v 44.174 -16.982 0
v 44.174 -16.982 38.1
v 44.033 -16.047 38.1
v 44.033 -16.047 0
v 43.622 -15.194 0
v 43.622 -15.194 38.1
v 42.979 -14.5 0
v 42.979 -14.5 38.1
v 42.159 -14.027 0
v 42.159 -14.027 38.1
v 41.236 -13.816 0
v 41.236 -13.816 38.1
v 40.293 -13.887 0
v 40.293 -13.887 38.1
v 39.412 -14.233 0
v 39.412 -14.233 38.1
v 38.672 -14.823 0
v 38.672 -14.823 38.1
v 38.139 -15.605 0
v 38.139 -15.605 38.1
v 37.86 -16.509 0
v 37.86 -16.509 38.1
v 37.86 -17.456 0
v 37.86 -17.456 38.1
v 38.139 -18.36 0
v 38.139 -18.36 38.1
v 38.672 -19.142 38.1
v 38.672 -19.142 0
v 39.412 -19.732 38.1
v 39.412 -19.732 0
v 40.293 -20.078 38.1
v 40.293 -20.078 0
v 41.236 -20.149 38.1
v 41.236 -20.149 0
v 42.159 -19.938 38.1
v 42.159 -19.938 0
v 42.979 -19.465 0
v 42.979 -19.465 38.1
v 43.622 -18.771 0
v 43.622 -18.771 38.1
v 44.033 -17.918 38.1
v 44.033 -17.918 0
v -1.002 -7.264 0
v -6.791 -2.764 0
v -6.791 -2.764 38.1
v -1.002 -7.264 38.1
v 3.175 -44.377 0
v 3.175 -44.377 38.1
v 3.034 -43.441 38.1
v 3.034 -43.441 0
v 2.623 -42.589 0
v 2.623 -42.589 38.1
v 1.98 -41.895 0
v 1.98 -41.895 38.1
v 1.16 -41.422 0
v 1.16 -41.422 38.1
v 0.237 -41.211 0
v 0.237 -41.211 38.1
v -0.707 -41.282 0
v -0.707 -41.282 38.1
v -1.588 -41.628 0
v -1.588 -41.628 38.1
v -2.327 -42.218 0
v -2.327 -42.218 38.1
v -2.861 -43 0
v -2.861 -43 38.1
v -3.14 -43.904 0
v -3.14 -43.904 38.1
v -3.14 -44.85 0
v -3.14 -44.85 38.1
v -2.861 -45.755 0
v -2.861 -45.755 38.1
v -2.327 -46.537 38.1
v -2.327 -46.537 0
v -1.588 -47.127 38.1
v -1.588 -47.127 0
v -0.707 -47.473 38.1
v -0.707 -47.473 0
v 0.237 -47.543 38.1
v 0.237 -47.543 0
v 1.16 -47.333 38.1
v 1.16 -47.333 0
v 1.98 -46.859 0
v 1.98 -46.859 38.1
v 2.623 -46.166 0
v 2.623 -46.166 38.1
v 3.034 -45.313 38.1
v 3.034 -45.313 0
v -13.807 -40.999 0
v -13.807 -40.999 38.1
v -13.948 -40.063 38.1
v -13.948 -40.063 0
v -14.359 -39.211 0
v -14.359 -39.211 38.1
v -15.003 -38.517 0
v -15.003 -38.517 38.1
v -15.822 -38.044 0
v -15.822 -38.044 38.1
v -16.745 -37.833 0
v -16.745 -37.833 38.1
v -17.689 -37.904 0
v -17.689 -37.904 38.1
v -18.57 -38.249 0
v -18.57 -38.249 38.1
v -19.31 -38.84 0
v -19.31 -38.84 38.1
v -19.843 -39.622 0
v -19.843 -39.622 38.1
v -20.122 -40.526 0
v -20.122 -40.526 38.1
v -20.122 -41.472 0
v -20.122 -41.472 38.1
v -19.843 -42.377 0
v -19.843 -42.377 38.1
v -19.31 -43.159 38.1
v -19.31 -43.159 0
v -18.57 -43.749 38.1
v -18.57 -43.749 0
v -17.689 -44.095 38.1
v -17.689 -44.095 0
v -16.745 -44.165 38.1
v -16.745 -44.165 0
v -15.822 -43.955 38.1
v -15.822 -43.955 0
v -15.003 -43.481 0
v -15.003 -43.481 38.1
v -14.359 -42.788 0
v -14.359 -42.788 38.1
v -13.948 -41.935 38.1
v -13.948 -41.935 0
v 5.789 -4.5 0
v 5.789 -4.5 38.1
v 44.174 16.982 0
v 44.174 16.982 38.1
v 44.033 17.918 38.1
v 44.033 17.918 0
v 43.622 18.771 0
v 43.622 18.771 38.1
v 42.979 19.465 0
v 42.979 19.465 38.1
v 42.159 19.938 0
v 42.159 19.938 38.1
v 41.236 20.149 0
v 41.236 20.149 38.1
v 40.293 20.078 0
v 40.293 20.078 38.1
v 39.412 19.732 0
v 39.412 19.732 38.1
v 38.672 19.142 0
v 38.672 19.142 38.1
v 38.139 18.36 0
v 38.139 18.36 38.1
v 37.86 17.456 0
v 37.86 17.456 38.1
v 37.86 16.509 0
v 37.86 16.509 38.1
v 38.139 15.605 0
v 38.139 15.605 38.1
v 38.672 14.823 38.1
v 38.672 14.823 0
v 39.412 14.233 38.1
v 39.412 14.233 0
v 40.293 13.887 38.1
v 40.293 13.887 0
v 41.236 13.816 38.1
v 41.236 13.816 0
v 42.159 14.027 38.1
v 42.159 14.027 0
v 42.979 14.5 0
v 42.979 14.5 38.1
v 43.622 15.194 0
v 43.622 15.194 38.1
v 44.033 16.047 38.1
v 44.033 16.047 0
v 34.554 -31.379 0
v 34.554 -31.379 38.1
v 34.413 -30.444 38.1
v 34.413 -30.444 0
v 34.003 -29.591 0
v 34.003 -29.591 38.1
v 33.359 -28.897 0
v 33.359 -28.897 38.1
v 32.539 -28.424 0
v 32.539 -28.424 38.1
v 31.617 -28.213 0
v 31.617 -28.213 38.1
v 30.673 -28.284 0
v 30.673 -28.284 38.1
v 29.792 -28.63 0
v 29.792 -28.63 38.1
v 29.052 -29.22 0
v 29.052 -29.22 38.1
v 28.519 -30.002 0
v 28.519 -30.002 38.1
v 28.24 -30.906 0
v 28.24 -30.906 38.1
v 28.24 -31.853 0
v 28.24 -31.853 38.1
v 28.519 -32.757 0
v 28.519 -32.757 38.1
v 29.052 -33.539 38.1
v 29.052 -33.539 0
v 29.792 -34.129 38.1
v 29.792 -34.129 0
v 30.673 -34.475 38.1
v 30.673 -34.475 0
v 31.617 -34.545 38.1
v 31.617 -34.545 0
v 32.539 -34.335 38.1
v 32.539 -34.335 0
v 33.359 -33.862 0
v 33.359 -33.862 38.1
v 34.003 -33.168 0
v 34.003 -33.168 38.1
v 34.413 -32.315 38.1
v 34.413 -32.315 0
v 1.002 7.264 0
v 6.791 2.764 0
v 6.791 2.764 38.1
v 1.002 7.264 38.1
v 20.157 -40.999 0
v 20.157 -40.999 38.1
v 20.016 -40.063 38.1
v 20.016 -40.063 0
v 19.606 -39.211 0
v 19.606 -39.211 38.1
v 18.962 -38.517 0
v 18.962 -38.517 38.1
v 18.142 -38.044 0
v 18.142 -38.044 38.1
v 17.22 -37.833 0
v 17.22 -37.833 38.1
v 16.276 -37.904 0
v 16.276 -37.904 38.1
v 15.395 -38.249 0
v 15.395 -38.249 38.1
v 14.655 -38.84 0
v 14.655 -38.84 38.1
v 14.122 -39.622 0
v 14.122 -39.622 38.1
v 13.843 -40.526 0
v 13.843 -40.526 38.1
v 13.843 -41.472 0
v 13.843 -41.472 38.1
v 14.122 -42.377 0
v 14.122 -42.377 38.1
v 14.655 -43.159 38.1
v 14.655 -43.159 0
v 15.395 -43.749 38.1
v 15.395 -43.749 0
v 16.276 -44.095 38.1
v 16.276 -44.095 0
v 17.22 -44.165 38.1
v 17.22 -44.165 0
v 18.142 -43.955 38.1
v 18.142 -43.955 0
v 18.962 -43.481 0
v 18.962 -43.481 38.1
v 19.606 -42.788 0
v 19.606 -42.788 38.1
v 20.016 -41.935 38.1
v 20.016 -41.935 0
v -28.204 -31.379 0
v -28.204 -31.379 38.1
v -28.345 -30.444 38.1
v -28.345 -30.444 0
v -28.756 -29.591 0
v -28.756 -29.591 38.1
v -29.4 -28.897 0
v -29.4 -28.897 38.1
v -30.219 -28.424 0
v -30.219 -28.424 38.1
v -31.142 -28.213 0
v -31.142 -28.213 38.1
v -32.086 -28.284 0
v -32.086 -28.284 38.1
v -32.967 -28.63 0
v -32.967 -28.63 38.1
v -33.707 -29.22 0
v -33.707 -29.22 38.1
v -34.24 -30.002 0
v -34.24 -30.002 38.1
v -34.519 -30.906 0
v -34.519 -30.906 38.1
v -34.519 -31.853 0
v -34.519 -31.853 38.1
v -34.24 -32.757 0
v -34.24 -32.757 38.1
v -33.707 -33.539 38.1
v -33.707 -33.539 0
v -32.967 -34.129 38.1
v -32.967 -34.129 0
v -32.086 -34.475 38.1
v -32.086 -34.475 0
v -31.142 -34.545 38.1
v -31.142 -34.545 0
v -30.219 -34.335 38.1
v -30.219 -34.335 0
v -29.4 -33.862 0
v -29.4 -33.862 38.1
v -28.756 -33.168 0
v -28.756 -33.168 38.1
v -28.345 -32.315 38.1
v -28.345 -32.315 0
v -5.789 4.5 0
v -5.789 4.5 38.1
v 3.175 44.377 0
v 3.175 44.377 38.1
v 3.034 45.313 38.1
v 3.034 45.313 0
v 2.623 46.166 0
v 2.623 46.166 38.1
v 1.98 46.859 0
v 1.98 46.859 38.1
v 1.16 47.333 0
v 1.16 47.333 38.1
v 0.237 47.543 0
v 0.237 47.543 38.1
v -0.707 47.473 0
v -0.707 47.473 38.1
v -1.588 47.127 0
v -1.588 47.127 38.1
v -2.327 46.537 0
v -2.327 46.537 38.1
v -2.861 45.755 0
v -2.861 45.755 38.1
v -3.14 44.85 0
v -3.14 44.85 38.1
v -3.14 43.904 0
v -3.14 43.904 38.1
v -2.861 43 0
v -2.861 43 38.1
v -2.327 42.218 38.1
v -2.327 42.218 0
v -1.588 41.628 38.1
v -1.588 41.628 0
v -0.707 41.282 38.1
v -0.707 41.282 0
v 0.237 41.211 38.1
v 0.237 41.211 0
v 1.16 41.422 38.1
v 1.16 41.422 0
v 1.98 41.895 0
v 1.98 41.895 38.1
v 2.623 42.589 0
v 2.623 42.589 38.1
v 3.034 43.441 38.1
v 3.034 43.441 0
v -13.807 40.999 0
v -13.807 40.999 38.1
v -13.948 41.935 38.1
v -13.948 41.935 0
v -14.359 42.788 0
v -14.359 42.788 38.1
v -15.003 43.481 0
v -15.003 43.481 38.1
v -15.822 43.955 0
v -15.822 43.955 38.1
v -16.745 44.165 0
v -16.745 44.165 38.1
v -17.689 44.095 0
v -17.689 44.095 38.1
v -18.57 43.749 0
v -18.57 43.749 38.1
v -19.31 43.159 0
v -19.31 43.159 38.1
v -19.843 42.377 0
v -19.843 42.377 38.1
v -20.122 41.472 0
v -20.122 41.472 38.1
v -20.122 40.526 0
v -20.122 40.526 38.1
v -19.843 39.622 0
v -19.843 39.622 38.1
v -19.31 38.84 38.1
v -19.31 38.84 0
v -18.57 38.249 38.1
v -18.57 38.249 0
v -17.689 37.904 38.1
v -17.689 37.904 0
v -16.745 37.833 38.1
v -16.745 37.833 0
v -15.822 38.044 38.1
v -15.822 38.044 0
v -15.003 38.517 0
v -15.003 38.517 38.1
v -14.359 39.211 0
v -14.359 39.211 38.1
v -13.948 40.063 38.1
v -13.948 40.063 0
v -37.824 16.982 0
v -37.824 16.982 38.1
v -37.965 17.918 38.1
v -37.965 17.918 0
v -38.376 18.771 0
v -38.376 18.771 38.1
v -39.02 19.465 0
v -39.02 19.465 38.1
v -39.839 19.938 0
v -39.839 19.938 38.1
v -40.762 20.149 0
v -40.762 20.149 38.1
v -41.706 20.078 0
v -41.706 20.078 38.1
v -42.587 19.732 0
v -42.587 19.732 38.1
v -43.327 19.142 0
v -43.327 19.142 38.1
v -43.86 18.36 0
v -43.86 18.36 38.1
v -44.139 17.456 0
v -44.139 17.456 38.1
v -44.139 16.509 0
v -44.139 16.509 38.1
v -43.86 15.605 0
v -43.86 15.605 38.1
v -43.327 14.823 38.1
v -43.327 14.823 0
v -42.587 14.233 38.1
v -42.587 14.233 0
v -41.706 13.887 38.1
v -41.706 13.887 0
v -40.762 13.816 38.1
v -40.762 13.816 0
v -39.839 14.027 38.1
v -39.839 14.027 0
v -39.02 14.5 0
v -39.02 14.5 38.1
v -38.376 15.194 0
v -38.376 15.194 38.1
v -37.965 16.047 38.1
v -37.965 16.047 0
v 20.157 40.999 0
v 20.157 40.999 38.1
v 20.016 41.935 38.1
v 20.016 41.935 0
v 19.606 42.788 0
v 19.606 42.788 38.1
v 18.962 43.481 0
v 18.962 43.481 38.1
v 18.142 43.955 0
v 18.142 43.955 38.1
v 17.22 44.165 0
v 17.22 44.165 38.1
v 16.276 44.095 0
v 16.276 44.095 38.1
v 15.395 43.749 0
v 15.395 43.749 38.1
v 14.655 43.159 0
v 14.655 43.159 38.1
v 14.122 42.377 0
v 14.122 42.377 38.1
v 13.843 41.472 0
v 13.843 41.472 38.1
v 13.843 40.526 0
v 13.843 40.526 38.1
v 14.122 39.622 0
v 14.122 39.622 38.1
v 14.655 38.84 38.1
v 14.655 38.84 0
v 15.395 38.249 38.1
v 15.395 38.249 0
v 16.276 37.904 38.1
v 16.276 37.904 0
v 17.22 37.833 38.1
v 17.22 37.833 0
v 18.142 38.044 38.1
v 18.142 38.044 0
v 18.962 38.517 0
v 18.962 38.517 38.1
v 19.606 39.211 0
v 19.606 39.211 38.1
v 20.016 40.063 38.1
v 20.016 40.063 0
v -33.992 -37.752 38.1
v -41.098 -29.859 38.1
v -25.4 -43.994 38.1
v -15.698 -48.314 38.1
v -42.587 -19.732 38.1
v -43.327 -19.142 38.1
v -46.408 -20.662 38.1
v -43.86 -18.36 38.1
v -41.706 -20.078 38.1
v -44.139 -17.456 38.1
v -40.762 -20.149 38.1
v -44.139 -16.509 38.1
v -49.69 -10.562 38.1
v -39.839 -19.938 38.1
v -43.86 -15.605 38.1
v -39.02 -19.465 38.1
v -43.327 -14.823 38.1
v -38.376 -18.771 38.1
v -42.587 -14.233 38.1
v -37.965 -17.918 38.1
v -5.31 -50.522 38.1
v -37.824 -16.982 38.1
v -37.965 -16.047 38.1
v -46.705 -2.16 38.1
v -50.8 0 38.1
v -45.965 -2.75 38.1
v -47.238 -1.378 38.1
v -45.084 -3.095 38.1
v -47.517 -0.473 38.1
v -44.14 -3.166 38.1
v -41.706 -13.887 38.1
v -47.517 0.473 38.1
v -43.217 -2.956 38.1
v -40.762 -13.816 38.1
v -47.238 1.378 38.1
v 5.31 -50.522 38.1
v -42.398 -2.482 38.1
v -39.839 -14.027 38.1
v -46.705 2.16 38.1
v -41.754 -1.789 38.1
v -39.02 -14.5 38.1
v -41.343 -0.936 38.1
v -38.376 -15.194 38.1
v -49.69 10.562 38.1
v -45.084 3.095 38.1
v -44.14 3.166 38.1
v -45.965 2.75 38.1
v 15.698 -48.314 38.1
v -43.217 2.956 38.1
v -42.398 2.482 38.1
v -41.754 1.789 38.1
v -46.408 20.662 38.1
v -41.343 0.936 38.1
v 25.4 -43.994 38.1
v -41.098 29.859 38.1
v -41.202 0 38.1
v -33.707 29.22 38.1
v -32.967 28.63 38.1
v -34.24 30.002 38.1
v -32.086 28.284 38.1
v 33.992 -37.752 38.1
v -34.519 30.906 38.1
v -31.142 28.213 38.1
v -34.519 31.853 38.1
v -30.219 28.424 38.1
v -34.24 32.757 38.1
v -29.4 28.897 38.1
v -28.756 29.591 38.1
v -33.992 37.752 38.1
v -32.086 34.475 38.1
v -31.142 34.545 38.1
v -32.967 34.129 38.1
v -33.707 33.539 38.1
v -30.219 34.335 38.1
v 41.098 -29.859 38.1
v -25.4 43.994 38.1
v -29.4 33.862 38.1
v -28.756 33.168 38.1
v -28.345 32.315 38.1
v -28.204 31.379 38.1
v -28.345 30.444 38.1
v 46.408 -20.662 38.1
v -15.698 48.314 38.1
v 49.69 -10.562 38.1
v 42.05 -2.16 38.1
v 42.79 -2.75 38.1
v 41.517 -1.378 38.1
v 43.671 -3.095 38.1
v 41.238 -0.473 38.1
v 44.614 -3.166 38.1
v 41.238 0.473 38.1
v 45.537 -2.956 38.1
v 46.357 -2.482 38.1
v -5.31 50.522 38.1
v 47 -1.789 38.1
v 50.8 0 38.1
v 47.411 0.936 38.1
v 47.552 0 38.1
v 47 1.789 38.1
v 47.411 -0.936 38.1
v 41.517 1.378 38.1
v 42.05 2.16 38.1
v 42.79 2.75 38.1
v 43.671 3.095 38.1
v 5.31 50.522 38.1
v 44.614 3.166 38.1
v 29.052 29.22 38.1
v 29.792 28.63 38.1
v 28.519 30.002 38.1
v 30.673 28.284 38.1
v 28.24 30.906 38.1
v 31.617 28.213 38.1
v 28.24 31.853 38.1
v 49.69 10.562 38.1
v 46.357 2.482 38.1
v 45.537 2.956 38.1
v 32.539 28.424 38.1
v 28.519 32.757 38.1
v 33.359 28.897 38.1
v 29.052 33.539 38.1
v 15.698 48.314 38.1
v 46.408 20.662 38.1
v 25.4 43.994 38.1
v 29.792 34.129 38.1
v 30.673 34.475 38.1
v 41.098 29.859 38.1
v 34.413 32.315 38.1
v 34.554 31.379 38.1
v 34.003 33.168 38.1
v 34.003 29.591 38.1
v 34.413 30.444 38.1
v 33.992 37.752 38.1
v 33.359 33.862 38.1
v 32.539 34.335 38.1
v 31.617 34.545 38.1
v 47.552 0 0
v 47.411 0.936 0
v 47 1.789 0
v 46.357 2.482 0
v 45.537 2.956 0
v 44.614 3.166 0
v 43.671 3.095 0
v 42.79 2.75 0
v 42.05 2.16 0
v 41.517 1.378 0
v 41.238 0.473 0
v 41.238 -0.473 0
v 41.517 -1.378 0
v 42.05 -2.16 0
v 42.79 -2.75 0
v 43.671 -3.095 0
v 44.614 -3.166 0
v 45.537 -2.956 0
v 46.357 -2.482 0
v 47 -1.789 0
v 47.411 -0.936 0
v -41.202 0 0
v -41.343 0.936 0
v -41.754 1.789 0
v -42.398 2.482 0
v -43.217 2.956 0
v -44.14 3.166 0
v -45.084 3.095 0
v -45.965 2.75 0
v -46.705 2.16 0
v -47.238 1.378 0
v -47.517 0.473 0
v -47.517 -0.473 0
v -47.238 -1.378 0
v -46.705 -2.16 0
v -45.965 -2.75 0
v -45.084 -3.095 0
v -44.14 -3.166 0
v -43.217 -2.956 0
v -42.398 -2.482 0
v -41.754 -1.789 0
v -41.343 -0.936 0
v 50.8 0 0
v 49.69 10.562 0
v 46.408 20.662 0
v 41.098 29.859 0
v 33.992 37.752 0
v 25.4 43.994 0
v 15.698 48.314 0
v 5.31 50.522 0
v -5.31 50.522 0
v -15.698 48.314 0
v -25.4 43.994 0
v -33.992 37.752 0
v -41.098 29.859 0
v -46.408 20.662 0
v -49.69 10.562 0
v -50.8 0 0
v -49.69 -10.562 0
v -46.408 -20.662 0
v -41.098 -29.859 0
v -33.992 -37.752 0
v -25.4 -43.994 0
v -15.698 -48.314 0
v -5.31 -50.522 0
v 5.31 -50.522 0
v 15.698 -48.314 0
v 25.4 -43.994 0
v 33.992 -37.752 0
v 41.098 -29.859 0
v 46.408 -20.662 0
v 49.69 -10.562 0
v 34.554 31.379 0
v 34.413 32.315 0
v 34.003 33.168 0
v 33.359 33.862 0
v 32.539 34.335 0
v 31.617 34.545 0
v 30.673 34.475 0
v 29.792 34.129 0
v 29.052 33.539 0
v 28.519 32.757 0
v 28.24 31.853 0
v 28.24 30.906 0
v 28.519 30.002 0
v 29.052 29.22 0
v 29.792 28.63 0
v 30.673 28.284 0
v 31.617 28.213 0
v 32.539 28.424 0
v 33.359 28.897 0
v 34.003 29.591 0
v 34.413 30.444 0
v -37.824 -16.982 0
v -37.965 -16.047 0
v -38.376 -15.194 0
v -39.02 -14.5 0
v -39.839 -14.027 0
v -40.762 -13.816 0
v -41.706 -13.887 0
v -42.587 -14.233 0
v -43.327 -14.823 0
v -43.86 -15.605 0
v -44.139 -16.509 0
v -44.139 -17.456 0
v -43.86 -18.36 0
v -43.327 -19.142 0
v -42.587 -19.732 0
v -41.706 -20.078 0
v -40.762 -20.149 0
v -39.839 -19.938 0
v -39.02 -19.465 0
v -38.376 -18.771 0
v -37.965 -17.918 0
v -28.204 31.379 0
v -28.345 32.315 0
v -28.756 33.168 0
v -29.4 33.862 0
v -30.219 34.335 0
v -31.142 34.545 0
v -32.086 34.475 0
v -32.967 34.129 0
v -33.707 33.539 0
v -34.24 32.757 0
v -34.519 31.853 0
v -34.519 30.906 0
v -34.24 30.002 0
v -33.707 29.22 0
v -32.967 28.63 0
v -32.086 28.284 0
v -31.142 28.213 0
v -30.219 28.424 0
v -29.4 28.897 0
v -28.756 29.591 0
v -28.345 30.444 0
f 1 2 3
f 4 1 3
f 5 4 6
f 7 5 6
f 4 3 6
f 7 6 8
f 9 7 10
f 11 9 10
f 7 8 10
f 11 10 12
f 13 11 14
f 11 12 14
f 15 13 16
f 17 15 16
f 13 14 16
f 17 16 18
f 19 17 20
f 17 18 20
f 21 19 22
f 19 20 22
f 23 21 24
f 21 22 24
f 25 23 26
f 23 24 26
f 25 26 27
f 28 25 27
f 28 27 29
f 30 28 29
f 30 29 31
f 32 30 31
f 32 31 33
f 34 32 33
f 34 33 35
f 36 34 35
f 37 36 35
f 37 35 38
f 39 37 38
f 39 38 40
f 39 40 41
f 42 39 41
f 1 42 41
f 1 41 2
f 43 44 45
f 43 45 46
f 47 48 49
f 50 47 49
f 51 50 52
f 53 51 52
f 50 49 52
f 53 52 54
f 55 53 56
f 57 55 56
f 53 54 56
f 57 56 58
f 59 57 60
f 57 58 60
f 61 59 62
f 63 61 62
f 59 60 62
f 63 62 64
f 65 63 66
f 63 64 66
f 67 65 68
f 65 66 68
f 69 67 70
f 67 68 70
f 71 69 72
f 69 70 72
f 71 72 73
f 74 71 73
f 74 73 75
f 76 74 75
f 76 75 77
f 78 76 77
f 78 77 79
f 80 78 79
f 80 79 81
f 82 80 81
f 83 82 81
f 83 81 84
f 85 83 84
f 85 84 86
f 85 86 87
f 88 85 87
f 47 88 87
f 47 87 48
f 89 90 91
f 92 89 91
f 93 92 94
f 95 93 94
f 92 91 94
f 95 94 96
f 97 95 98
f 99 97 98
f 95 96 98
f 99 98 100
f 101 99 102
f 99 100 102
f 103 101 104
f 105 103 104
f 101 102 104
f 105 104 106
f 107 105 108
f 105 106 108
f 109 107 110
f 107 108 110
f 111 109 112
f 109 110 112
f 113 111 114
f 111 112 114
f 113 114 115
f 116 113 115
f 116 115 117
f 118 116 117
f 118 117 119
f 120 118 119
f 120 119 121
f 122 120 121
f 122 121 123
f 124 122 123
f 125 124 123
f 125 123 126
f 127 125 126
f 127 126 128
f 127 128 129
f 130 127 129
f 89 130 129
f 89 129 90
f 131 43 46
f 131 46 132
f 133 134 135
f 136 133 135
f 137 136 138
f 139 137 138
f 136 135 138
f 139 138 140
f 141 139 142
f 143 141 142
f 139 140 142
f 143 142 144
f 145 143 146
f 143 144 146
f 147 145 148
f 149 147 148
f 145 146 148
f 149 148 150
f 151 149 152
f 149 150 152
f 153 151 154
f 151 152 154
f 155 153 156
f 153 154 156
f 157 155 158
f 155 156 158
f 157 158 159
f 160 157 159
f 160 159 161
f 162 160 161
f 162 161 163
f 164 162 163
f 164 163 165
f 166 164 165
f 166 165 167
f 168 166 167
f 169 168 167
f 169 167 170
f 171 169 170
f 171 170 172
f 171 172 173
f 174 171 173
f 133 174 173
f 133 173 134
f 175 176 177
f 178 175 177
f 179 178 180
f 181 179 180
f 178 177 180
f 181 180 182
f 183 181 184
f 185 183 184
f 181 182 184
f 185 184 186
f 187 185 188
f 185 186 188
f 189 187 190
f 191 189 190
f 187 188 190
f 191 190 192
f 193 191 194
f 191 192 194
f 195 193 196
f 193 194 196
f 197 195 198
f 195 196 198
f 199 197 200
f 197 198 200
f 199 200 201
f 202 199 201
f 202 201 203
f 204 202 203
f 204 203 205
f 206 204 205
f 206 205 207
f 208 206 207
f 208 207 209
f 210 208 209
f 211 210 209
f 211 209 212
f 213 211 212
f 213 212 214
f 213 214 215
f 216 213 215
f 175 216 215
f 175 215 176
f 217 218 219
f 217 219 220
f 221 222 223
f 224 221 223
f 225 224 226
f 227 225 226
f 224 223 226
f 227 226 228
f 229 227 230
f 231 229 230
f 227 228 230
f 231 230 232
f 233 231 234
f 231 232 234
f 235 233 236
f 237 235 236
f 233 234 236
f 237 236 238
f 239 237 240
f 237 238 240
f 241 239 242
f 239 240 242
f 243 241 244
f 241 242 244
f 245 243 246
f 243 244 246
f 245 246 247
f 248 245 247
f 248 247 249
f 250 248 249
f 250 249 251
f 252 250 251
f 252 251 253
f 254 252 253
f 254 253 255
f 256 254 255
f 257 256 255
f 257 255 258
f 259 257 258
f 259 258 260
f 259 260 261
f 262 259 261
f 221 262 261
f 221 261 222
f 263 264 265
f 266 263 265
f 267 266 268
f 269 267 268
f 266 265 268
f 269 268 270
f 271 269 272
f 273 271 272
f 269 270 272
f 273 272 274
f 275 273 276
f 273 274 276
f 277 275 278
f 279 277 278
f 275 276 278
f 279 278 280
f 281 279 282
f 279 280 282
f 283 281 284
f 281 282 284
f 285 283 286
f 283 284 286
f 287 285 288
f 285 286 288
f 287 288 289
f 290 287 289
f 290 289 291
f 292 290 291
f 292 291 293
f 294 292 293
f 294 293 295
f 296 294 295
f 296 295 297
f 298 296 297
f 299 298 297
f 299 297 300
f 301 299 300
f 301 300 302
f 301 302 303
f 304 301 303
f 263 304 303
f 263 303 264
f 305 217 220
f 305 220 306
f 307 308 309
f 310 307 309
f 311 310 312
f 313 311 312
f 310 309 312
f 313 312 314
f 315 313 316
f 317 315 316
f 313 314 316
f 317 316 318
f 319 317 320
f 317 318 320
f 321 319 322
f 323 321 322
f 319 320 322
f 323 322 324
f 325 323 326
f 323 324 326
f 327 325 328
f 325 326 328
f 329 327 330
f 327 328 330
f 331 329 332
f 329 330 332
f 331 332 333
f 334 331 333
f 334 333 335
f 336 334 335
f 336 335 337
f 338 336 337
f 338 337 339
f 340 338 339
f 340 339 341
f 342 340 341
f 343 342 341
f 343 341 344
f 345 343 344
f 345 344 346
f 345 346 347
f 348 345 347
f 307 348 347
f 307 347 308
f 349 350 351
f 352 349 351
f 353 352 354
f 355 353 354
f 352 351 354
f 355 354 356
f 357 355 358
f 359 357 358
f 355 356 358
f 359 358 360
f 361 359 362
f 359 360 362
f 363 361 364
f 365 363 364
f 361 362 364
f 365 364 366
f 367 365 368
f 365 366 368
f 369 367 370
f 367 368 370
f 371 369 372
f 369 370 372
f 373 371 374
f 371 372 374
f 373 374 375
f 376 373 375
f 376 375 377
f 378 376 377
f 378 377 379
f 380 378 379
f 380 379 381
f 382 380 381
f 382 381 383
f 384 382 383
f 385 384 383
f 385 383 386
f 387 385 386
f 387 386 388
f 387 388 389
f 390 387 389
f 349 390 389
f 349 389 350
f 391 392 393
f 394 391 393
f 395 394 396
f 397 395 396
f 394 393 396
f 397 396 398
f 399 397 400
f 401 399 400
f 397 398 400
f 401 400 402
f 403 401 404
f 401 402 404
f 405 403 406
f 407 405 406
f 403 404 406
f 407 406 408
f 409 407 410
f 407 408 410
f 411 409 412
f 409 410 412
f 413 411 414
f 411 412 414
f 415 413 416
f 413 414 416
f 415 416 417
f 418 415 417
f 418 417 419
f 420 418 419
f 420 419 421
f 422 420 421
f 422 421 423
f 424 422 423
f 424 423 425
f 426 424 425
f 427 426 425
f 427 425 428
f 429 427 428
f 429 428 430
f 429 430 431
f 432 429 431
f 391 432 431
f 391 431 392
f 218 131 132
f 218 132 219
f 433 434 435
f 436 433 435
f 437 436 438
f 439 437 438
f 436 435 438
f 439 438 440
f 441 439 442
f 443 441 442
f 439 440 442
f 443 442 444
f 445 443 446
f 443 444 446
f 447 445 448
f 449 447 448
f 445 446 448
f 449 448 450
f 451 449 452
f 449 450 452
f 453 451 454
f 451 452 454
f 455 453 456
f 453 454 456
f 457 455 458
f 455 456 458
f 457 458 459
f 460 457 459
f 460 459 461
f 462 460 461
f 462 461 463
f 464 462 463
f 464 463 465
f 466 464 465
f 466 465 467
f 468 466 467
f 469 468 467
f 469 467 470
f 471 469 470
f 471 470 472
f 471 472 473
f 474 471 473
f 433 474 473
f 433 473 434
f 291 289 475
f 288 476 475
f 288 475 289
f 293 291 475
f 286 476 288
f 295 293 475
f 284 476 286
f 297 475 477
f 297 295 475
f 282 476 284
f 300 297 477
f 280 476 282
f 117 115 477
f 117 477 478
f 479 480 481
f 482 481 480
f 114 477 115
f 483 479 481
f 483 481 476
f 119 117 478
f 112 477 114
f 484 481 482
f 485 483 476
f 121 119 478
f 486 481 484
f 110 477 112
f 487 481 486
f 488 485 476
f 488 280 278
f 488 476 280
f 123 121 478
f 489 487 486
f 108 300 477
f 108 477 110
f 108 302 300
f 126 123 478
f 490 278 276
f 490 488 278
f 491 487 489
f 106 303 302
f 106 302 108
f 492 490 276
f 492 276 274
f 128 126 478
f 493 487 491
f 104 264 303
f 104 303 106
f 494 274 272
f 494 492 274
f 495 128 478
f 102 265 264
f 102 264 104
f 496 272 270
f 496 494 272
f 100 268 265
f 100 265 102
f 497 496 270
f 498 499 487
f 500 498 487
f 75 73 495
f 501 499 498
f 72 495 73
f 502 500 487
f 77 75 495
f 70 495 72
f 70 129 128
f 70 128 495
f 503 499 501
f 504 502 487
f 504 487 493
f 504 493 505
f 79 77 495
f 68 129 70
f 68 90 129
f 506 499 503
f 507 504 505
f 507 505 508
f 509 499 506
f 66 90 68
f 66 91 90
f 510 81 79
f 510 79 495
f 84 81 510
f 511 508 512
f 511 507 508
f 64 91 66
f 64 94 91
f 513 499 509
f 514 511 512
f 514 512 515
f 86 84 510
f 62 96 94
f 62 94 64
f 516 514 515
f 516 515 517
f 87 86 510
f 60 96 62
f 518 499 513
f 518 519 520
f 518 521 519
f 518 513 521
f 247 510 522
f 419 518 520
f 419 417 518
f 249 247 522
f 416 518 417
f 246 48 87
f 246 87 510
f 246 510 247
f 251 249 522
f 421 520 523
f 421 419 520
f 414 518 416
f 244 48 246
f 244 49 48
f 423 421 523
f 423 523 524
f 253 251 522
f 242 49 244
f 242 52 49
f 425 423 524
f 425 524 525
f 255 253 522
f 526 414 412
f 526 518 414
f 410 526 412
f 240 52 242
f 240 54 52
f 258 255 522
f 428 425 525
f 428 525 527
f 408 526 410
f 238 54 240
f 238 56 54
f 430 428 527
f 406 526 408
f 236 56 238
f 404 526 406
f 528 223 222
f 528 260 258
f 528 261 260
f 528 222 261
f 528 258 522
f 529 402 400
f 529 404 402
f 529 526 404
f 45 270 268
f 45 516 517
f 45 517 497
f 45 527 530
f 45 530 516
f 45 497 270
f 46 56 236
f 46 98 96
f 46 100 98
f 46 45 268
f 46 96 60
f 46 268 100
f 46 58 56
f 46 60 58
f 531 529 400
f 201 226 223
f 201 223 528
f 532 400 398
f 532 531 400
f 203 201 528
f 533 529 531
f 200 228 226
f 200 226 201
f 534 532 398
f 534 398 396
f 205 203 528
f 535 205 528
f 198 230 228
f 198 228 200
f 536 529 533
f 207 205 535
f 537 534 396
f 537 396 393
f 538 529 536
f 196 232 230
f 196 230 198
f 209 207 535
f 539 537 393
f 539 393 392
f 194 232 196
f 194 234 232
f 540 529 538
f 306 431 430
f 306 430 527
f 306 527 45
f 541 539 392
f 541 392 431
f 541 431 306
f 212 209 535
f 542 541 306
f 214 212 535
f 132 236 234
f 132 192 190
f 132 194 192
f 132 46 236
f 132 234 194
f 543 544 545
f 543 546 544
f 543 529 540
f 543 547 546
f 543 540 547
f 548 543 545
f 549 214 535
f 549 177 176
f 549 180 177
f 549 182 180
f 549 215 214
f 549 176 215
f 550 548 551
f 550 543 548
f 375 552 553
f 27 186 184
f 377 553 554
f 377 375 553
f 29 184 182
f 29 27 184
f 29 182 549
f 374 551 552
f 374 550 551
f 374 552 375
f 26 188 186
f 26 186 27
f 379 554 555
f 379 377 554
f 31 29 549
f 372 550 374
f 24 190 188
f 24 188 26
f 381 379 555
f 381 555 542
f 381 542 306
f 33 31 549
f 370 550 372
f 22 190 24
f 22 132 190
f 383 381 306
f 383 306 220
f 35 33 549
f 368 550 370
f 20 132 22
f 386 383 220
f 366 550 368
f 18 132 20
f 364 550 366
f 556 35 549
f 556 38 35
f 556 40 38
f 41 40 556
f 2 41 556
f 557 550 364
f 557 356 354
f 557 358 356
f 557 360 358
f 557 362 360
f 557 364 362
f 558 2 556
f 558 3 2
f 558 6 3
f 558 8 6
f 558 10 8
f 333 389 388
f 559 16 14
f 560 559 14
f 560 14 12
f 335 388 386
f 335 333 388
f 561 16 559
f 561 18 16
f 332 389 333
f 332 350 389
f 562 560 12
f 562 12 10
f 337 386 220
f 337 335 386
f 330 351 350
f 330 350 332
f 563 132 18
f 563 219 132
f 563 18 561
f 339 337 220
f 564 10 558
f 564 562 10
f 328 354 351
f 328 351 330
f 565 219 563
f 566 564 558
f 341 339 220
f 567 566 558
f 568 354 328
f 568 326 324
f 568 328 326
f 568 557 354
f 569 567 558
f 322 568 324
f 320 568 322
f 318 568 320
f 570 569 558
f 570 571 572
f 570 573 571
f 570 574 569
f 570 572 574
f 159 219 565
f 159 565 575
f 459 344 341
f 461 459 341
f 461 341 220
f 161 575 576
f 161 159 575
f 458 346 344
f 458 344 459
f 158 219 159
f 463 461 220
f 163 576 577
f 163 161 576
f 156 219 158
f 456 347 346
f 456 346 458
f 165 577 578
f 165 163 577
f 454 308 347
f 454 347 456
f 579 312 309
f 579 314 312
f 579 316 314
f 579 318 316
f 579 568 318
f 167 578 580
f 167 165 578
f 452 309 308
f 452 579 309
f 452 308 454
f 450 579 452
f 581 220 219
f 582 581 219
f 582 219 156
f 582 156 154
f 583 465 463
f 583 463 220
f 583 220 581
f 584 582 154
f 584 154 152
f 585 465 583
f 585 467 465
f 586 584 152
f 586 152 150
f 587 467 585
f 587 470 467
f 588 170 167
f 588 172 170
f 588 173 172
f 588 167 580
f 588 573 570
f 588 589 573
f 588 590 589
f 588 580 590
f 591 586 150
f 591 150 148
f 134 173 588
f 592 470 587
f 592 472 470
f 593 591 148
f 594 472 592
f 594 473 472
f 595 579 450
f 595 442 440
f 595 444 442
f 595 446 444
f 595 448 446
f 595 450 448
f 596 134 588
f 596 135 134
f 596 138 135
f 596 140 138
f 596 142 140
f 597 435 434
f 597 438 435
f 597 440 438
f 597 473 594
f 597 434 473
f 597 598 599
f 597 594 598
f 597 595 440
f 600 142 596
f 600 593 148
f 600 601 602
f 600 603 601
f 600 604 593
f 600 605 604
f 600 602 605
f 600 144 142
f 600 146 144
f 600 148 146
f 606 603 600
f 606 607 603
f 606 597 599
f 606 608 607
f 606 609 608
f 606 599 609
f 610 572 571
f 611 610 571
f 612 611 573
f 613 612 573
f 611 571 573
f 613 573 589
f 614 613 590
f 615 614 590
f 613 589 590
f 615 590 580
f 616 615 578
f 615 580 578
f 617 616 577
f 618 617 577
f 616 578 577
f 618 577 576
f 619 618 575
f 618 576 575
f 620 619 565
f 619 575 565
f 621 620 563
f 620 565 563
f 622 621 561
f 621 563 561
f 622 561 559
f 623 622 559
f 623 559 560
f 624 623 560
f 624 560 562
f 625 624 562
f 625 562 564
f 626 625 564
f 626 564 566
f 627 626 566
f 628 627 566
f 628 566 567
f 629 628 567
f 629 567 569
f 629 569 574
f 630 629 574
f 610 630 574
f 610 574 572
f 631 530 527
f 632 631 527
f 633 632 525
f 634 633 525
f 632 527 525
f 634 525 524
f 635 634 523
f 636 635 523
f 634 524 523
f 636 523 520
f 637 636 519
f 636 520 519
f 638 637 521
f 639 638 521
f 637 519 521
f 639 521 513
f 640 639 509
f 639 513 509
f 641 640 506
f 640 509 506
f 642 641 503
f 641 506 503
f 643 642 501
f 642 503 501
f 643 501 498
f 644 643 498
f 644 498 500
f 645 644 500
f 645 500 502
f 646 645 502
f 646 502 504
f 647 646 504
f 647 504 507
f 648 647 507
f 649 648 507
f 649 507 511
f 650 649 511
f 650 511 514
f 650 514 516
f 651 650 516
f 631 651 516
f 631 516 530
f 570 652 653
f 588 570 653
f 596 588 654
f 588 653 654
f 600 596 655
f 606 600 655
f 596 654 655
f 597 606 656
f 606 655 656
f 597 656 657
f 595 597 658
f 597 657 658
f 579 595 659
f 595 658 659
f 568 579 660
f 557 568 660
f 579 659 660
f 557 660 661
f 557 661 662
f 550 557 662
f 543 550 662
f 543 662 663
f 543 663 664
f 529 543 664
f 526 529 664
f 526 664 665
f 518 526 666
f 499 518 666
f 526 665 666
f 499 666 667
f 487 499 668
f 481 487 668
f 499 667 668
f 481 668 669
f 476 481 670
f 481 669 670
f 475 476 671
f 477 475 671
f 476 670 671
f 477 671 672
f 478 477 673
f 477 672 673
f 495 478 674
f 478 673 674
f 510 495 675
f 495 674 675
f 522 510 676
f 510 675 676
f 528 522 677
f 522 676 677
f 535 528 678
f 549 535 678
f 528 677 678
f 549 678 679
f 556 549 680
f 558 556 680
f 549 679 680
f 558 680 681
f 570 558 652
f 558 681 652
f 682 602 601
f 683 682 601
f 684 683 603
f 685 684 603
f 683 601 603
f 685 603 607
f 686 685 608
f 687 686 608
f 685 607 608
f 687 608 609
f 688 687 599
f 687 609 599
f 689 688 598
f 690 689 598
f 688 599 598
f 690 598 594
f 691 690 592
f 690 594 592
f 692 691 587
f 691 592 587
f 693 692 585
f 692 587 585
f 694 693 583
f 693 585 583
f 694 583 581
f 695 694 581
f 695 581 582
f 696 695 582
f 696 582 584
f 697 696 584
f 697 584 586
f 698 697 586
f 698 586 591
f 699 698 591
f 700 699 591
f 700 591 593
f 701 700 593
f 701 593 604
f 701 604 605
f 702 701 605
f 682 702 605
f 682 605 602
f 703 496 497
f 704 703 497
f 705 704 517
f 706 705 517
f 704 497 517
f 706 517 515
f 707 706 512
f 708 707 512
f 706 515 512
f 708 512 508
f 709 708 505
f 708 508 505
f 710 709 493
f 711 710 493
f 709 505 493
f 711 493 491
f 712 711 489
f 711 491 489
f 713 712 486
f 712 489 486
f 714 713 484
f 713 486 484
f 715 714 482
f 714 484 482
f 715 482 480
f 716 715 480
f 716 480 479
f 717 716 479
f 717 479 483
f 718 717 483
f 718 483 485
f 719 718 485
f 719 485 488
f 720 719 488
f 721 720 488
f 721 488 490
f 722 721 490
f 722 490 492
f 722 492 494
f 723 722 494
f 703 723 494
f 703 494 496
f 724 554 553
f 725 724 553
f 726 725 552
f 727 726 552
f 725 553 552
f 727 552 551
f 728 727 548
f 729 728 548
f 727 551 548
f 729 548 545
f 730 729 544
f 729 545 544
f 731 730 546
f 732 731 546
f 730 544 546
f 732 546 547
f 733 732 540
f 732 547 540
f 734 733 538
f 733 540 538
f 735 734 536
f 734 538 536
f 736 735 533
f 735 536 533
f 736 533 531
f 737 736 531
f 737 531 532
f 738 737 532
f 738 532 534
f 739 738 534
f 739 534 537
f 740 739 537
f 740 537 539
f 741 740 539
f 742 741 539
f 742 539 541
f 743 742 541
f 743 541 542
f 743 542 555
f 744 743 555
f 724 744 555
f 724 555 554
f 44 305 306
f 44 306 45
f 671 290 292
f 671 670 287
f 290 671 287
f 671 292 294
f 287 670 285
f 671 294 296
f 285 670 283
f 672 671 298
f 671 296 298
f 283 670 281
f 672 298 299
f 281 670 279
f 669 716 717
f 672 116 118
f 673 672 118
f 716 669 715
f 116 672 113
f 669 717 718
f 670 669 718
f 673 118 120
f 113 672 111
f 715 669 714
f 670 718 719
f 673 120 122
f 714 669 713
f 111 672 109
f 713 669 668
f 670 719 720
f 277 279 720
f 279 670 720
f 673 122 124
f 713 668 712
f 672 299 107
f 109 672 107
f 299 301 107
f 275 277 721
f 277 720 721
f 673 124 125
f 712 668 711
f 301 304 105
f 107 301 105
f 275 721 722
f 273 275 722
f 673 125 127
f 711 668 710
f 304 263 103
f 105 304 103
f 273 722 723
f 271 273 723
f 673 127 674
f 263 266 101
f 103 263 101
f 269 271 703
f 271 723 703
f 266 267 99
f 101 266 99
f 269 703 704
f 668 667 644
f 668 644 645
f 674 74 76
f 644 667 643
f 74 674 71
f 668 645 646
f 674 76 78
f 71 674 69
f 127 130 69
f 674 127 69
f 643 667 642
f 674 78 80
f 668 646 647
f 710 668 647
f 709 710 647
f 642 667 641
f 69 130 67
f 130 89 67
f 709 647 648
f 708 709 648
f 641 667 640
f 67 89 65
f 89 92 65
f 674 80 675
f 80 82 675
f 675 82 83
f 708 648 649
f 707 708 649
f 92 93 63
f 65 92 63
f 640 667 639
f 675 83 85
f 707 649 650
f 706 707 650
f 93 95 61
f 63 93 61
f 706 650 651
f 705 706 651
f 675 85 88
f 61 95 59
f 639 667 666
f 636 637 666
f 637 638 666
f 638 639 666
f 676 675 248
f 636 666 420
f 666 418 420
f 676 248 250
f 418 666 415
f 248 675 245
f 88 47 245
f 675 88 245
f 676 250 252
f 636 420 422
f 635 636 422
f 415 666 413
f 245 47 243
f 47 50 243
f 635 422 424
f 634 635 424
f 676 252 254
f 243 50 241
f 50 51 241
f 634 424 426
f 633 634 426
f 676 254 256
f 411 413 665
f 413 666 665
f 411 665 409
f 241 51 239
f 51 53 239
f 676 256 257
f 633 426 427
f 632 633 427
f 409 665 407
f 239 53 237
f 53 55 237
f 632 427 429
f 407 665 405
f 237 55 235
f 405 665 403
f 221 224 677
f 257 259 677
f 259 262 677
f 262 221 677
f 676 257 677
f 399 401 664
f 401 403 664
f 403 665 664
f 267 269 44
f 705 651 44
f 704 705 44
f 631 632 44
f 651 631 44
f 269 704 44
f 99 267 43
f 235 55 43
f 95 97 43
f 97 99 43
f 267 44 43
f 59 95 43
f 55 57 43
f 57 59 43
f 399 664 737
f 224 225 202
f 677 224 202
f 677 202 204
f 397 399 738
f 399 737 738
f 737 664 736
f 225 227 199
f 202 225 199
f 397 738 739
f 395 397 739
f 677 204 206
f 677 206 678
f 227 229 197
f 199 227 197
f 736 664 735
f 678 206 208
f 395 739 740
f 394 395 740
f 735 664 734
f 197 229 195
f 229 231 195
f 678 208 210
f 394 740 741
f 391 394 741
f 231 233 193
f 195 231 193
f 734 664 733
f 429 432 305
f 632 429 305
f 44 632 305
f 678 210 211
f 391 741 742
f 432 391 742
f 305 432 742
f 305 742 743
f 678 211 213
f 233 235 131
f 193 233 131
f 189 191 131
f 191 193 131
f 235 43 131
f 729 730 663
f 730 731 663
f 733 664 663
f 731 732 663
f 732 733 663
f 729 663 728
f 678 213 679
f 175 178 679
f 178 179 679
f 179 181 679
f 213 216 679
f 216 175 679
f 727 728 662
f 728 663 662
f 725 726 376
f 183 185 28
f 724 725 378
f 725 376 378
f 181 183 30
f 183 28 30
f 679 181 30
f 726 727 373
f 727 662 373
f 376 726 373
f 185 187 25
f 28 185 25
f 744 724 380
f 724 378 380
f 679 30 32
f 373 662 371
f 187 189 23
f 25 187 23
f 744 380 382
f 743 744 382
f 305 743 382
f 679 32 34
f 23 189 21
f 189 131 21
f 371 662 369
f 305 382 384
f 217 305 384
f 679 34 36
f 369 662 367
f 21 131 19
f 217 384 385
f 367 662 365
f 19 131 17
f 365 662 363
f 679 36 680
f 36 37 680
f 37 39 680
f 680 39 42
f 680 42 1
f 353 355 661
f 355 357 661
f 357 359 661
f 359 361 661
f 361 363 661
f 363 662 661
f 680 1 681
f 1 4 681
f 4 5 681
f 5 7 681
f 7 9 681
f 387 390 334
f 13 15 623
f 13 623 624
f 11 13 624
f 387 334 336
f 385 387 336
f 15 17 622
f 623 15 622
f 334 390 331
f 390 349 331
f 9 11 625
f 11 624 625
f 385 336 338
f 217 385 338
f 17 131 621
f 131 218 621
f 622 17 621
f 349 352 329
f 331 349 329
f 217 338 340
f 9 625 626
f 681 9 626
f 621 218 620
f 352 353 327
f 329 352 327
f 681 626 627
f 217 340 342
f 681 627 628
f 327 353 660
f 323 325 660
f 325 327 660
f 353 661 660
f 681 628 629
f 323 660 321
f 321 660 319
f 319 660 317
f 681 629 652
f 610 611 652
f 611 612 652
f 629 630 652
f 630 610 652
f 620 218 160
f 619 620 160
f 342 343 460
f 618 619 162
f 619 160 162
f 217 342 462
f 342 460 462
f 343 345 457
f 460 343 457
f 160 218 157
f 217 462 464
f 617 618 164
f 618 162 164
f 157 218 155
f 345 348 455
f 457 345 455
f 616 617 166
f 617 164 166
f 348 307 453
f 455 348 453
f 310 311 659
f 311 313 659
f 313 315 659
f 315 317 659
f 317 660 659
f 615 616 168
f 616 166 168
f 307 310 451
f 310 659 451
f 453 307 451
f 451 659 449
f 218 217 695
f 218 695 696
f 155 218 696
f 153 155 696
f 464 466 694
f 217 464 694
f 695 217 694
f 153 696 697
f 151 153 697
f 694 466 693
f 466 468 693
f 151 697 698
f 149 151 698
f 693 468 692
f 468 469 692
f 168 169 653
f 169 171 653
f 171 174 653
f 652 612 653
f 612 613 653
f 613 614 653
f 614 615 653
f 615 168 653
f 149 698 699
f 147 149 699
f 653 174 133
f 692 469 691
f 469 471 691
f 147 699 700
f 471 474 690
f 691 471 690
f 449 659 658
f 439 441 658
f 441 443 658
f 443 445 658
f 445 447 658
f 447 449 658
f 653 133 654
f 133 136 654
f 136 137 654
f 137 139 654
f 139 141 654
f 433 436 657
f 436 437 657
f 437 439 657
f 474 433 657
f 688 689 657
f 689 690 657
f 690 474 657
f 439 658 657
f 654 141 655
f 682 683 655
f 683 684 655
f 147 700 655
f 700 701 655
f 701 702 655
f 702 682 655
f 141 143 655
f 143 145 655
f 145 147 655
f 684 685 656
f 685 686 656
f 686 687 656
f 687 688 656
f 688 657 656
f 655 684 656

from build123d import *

# Parameters (mm, degrees)
SKETCH1_R           = 50.8
BOSS_EXTRUDE1_DEPTH = 38.1
SKETCH2_R           = 3.175
CUT_EXTRUDE1_DEPTH  = 39.1


with BuildPart() as part:
    # Sketch1 → Boss-Extrude1 (new body)
    with BuildSketch(Plane.XY):
        Circle(SKETCH1_R)
        Polygon((5.789348381, -4.499642059), (6.791478521, 2.76390174), (1.00213014, 7.263543799), (-5.789348381, 4.499642059), (-6.791478521, -2.76390174), (-1.00213014, -7.263543799), align=None, mode=Mode.SUBTRACT)
    extrude(amount=BOSS_EXTRUDE1_DEPTH)

    # Sketch2 → Cut-Extrude1 (cut, through all)
    with BuildSketch(Plane.XY.offset(38.1)):
        with Locations((0, 44.377138181)):
            Circle(SKETCH2_R)
        with Locations((16.982395558, 40.999129677)):
            Circle(SKETCH2_R)
        with Locations((31.379375337, 31.379375337)):
            Circle(SKETCH2_R)
        with Locations((40.999129677, 16.982395558)):
            Circle(SKETCH2_R)
        with Locations((44.377138181, 0)):
            Circle(SKETCH2_R)
        with Locations((40.999129677, -16.982395558)):
            Circle(SKETCH2_R)
        with Locations((31.379375337, -31.379375337)):
            Circle(SKETCH2_R)
        with Locations((16.982395558, -40.999129677)):
            Circle(SKETCH2_R)
        with Locations((0, -44.377138181)):
            Circle(SKETCH2_R)
        with Locations((-16.982395558, -40.999129677)):
            Circle(SKETCH2_R)
        with Locations((-31.379375337, -31.379375337)):
            Circle(SKETCH2_R)
        with Locations((-40.999129677, -16.982395558)):
            Circle(SKETCH2_R)
        with Locations((-44.377138181, 0)):
            Circle(SKETCH2_R)
        with Locations((-40.999129677, 16.982395558)):
            Circle(SKETCH2_R)
        with Locations((-31.379375337, 31.379375337)):
            Circle(SKETCH2_R)
        with Locations((-16.982395558, 40.999129677)):
            Circle(SKETCH2_R)
    extrude(amount=-CUT_EXTRUDE1_DEPTH, mode=Mode.SUBTRACT)


solid = part.part
